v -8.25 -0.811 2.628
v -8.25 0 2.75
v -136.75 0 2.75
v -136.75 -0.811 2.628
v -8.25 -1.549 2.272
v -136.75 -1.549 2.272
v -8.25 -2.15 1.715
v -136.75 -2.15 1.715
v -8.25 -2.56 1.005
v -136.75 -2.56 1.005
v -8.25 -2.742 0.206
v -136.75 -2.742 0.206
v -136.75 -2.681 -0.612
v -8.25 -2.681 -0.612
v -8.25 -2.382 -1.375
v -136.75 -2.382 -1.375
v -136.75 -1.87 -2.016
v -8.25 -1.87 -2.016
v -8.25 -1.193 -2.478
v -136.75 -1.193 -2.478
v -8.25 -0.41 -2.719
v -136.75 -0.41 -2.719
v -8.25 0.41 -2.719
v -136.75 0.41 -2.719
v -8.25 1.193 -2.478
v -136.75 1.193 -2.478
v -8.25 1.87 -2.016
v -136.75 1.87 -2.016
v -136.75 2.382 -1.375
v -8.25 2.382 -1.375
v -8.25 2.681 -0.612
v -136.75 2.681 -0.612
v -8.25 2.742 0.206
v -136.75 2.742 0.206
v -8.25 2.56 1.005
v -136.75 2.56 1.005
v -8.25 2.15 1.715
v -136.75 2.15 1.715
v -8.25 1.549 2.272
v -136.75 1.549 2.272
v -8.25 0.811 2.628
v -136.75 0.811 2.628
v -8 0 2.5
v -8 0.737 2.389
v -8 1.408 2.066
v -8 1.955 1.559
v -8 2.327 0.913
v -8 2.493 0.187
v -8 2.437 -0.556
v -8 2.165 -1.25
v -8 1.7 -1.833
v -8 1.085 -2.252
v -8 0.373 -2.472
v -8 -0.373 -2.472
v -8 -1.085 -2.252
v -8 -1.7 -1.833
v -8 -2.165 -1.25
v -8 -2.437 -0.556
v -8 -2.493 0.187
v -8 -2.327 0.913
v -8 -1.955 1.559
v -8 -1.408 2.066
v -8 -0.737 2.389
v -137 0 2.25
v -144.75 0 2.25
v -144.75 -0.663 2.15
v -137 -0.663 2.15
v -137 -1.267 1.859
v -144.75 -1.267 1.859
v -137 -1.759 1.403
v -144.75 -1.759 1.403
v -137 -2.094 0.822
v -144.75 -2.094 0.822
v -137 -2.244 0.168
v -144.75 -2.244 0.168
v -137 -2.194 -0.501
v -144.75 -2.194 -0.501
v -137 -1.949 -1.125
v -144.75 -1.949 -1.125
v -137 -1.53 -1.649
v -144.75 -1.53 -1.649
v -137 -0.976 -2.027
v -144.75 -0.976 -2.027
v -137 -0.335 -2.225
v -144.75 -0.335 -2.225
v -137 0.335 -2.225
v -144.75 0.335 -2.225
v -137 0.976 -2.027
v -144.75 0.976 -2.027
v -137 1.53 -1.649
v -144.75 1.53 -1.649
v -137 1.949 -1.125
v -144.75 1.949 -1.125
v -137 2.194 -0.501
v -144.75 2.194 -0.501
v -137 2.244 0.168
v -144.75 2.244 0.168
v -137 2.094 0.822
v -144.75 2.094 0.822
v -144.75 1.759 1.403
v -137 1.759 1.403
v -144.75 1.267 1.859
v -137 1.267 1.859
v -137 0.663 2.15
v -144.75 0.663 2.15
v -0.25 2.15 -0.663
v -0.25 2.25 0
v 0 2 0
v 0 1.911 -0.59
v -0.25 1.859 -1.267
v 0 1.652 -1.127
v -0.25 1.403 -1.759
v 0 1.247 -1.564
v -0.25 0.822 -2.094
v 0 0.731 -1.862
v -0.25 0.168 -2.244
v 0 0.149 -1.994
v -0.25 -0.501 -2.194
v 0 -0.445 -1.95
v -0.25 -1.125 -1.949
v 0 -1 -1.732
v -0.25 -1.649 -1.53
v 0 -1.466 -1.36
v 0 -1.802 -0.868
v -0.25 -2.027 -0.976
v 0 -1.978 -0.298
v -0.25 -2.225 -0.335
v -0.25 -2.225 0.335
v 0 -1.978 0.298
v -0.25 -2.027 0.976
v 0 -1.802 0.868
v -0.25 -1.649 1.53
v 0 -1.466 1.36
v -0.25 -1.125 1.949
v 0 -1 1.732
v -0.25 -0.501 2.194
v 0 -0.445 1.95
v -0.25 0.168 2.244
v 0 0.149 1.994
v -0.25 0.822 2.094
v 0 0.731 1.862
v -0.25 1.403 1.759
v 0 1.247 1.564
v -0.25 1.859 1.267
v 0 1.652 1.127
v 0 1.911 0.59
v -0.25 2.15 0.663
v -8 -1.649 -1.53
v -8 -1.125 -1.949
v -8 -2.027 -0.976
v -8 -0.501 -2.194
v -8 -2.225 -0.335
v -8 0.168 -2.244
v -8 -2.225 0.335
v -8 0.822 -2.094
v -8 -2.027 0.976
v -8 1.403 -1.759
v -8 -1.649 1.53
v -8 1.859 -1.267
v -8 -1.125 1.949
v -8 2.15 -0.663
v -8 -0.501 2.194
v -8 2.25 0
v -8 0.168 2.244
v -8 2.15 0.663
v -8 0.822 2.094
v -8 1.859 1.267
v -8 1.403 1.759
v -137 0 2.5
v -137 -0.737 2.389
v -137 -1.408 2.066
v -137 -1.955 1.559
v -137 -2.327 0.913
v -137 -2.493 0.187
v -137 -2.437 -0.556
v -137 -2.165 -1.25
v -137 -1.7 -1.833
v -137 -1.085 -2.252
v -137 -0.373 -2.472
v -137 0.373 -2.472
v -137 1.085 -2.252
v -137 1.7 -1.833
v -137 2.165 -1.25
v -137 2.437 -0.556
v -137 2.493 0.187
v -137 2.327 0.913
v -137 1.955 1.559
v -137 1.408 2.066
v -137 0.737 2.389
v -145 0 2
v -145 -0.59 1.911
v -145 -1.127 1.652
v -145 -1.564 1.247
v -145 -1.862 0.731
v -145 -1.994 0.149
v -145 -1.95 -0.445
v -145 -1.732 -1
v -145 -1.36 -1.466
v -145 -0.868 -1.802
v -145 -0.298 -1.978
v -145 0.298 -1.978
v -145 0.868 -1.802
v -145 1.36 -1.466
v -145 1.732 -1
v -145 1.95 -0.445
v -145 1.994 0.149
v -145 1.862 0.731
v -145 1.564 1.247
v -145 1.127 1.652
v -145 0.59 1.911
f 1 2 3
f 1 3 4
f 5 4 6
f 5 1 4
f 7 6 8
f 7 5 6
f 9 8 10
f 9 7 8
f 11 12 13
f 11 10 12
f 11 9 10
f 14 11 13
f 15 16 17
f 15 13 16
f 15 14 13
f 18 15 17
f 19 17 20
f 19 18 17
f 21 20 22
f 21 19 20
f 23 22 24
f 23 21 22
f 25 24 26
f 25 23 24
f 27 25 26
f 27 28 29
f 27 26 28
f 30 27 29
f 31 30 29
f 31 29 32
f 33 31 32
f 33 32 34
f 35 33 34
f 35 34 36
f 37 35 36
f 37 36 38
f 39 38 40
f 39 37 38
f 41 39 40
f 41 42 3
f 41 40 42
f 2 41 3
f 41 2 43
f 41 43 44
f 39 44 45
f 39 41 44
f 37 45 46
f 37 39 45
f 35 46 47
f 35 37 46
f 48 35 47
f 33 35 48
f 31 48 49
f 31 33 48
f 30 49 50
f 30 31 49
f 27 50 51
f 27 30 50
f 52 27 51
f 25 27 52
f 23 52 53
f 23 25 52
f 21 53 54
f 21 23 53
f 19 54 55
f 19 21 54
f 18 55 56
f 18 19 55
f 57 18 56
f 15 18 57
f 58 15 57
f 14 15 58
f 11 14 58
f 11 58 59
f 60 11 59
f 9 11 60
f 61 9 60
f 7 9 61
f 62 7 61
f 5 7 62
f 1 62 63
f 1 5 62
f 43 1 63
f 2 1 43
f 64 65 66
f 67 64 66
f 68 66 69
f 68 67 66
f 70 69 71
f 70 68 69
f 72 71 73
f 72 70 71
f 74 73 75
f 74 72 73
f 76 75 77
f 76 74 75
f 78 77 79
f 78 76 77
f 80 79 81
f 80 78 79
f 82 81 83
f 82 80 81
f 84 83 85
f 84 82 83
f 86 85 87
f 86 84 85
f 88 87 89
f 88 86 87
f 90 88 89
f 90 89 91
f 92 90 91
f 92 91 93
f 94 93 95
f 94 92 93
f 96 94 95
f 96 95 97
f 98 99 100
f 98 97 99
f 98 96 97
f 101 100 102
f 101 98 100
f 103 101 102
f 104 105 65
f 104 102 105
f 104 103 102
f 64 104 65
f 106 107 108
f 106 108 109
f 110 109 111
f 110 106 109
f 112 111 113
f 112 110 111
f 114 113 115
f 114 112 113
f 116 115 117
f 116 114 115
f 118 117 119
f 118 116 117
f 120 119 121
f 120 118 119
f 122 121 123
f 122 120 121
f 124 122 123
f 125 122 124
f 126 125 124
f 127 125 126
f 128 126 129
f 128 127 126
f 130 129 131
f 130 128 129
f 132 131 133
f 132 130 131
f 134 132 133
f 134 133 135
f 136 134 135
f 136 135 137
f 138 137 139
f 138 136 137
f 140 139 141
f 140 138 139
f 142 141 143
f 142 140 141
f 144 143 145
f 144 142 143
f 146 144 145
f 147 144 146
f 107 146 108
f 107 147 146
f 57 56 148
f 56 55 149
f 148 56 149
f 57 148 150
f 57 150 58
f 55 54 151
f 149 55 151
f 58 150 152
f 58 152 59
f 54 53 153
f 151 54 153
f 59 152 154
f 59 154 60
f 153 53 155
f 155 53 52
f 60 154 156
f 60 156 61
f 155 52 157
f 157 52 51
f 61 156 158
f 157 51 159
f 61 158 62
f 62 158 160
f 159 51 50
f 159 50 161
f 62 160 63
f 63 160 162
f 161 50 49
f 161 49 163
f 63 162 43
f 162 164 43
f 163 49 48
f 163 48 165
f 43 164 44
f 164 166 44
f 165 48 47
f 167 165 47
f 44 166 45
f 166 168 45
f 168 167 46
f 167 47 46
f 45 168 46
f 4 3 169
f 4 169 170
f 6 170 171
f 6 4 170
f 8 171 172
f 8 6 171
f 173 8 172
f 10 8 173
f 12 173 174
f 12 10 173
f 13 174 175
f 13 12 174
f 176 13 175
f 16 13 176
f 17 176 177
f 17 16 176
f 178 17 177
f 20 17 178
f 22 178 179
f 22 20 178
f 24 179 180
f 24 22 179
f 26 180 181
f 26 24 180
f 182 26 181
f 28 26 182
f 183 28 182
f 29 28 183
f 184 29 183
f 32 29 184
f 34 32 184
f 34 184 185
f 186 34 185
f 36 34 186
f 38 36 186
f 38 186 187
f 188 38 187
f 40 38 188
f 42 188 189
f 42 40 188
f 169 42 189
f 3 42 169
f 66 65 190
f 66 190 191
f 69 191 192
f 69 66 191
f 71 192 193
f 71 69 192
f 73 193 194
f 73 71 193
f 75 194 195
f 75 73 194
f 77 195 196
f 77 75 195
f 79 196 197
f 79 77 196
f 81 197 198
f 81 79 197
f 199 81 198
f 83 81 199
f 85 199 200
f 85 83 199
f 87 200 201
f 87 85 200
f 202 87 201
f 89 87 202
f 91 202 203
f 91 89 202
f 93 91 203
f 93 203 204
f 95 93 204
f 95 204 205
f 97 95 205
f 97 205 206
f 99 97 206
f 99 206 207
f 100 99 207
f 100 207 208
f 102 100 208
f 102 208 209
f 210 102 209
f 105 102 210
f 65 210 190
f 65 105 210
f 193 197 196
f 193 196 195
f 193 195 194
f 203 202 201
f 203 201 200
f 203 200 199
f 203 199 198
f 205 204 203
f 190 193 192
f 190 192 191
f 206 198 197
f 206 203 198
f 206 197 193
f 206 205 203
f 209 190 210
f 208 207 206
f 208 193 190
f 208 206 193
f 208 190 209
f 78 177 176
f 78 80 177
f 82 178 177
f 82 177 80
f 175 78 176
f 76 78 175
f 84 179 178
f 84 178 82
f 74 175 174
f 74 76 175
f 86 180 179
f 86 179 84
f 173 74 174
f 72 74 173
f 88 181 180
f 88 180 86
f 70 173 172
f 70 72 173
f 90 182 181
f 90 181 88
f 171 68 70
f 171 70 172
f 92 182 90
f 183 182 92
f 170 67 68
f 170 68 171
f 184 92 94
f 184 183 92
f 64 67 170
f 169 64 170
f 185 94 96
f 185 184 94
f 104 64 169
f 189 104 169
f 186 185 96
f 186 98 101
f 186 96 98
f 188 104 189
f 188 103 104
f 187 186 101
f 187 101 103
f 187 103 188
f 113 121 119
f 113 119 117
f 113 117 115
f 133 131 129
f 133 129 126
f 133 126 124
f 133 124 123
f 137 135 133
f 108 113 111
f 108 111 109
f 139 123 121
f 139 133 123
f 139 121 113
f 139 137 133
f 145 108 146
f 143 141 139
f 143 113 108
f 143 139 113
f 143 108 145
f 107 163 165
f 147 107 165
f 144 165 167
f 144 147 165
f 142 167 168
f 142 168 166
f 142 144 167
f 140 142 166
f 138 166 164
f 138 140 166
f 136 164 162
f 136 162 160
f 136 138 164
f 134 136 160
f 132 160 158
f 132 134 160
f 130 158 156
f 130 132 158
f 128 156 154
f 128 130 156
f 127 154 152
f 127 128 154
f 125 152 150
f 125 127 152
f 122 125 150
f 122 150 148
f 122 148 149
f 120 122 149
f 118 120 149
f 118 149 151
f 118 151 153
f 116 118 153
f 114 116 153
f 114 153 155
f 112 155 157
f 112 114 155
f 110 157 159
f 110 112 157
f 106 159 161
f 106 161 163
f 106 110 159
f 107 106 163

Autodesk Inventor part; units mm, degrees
ref_plane "YZ Plane" through (0, 0, 0) normal (1, 0, 0) x (0, 1, 0)
ref_plane "XZ Plane" through (0, 0, 0) normal (0, 1, 0) x (-1, 0, 0)
ref_plane "XY Plane" through (0, 0, 0) normal (0, 0, 1) x (1, 0, 0)
sketch "Sketch1" plane through (0, 0, 0) normal (1, 0, 0) x (0, 1, 0)
  circle A0 centre (0, 0) radius 2.25
  dimension "d0" = 4.5
extrude "Extrusion1" add sketch "Sketch1" against normal blind 8
sketch "Sketch2" plane through (-8, 0, 0) normal (-1, 0, 0) x (0, 0, 1)
  circle A0 centre (0, 0) radius 2.75
  dimension "d6" = 5.5
extrude "Extrusion2" add sketch "Sketch2" along normal blind 129
sketch "Sketch3" plane through (-137, 0, 0) normal (-1, 0, 0) x (0, 0, 1)
  circle A0 centre (0, 0) radius 2.25
  dimension "d9" = 4.5
extrude "Extrusion3" add sketch "Sketch3" along normal blind 8
chamfer "Chamfer2" distance 0.25 angle 45 4 edges at (0, -2.25, 0) (-8, 0, -2.75) (-137, 0, -2.75) (-145, 0, -2.25)
properties part number "Ø5x145"
